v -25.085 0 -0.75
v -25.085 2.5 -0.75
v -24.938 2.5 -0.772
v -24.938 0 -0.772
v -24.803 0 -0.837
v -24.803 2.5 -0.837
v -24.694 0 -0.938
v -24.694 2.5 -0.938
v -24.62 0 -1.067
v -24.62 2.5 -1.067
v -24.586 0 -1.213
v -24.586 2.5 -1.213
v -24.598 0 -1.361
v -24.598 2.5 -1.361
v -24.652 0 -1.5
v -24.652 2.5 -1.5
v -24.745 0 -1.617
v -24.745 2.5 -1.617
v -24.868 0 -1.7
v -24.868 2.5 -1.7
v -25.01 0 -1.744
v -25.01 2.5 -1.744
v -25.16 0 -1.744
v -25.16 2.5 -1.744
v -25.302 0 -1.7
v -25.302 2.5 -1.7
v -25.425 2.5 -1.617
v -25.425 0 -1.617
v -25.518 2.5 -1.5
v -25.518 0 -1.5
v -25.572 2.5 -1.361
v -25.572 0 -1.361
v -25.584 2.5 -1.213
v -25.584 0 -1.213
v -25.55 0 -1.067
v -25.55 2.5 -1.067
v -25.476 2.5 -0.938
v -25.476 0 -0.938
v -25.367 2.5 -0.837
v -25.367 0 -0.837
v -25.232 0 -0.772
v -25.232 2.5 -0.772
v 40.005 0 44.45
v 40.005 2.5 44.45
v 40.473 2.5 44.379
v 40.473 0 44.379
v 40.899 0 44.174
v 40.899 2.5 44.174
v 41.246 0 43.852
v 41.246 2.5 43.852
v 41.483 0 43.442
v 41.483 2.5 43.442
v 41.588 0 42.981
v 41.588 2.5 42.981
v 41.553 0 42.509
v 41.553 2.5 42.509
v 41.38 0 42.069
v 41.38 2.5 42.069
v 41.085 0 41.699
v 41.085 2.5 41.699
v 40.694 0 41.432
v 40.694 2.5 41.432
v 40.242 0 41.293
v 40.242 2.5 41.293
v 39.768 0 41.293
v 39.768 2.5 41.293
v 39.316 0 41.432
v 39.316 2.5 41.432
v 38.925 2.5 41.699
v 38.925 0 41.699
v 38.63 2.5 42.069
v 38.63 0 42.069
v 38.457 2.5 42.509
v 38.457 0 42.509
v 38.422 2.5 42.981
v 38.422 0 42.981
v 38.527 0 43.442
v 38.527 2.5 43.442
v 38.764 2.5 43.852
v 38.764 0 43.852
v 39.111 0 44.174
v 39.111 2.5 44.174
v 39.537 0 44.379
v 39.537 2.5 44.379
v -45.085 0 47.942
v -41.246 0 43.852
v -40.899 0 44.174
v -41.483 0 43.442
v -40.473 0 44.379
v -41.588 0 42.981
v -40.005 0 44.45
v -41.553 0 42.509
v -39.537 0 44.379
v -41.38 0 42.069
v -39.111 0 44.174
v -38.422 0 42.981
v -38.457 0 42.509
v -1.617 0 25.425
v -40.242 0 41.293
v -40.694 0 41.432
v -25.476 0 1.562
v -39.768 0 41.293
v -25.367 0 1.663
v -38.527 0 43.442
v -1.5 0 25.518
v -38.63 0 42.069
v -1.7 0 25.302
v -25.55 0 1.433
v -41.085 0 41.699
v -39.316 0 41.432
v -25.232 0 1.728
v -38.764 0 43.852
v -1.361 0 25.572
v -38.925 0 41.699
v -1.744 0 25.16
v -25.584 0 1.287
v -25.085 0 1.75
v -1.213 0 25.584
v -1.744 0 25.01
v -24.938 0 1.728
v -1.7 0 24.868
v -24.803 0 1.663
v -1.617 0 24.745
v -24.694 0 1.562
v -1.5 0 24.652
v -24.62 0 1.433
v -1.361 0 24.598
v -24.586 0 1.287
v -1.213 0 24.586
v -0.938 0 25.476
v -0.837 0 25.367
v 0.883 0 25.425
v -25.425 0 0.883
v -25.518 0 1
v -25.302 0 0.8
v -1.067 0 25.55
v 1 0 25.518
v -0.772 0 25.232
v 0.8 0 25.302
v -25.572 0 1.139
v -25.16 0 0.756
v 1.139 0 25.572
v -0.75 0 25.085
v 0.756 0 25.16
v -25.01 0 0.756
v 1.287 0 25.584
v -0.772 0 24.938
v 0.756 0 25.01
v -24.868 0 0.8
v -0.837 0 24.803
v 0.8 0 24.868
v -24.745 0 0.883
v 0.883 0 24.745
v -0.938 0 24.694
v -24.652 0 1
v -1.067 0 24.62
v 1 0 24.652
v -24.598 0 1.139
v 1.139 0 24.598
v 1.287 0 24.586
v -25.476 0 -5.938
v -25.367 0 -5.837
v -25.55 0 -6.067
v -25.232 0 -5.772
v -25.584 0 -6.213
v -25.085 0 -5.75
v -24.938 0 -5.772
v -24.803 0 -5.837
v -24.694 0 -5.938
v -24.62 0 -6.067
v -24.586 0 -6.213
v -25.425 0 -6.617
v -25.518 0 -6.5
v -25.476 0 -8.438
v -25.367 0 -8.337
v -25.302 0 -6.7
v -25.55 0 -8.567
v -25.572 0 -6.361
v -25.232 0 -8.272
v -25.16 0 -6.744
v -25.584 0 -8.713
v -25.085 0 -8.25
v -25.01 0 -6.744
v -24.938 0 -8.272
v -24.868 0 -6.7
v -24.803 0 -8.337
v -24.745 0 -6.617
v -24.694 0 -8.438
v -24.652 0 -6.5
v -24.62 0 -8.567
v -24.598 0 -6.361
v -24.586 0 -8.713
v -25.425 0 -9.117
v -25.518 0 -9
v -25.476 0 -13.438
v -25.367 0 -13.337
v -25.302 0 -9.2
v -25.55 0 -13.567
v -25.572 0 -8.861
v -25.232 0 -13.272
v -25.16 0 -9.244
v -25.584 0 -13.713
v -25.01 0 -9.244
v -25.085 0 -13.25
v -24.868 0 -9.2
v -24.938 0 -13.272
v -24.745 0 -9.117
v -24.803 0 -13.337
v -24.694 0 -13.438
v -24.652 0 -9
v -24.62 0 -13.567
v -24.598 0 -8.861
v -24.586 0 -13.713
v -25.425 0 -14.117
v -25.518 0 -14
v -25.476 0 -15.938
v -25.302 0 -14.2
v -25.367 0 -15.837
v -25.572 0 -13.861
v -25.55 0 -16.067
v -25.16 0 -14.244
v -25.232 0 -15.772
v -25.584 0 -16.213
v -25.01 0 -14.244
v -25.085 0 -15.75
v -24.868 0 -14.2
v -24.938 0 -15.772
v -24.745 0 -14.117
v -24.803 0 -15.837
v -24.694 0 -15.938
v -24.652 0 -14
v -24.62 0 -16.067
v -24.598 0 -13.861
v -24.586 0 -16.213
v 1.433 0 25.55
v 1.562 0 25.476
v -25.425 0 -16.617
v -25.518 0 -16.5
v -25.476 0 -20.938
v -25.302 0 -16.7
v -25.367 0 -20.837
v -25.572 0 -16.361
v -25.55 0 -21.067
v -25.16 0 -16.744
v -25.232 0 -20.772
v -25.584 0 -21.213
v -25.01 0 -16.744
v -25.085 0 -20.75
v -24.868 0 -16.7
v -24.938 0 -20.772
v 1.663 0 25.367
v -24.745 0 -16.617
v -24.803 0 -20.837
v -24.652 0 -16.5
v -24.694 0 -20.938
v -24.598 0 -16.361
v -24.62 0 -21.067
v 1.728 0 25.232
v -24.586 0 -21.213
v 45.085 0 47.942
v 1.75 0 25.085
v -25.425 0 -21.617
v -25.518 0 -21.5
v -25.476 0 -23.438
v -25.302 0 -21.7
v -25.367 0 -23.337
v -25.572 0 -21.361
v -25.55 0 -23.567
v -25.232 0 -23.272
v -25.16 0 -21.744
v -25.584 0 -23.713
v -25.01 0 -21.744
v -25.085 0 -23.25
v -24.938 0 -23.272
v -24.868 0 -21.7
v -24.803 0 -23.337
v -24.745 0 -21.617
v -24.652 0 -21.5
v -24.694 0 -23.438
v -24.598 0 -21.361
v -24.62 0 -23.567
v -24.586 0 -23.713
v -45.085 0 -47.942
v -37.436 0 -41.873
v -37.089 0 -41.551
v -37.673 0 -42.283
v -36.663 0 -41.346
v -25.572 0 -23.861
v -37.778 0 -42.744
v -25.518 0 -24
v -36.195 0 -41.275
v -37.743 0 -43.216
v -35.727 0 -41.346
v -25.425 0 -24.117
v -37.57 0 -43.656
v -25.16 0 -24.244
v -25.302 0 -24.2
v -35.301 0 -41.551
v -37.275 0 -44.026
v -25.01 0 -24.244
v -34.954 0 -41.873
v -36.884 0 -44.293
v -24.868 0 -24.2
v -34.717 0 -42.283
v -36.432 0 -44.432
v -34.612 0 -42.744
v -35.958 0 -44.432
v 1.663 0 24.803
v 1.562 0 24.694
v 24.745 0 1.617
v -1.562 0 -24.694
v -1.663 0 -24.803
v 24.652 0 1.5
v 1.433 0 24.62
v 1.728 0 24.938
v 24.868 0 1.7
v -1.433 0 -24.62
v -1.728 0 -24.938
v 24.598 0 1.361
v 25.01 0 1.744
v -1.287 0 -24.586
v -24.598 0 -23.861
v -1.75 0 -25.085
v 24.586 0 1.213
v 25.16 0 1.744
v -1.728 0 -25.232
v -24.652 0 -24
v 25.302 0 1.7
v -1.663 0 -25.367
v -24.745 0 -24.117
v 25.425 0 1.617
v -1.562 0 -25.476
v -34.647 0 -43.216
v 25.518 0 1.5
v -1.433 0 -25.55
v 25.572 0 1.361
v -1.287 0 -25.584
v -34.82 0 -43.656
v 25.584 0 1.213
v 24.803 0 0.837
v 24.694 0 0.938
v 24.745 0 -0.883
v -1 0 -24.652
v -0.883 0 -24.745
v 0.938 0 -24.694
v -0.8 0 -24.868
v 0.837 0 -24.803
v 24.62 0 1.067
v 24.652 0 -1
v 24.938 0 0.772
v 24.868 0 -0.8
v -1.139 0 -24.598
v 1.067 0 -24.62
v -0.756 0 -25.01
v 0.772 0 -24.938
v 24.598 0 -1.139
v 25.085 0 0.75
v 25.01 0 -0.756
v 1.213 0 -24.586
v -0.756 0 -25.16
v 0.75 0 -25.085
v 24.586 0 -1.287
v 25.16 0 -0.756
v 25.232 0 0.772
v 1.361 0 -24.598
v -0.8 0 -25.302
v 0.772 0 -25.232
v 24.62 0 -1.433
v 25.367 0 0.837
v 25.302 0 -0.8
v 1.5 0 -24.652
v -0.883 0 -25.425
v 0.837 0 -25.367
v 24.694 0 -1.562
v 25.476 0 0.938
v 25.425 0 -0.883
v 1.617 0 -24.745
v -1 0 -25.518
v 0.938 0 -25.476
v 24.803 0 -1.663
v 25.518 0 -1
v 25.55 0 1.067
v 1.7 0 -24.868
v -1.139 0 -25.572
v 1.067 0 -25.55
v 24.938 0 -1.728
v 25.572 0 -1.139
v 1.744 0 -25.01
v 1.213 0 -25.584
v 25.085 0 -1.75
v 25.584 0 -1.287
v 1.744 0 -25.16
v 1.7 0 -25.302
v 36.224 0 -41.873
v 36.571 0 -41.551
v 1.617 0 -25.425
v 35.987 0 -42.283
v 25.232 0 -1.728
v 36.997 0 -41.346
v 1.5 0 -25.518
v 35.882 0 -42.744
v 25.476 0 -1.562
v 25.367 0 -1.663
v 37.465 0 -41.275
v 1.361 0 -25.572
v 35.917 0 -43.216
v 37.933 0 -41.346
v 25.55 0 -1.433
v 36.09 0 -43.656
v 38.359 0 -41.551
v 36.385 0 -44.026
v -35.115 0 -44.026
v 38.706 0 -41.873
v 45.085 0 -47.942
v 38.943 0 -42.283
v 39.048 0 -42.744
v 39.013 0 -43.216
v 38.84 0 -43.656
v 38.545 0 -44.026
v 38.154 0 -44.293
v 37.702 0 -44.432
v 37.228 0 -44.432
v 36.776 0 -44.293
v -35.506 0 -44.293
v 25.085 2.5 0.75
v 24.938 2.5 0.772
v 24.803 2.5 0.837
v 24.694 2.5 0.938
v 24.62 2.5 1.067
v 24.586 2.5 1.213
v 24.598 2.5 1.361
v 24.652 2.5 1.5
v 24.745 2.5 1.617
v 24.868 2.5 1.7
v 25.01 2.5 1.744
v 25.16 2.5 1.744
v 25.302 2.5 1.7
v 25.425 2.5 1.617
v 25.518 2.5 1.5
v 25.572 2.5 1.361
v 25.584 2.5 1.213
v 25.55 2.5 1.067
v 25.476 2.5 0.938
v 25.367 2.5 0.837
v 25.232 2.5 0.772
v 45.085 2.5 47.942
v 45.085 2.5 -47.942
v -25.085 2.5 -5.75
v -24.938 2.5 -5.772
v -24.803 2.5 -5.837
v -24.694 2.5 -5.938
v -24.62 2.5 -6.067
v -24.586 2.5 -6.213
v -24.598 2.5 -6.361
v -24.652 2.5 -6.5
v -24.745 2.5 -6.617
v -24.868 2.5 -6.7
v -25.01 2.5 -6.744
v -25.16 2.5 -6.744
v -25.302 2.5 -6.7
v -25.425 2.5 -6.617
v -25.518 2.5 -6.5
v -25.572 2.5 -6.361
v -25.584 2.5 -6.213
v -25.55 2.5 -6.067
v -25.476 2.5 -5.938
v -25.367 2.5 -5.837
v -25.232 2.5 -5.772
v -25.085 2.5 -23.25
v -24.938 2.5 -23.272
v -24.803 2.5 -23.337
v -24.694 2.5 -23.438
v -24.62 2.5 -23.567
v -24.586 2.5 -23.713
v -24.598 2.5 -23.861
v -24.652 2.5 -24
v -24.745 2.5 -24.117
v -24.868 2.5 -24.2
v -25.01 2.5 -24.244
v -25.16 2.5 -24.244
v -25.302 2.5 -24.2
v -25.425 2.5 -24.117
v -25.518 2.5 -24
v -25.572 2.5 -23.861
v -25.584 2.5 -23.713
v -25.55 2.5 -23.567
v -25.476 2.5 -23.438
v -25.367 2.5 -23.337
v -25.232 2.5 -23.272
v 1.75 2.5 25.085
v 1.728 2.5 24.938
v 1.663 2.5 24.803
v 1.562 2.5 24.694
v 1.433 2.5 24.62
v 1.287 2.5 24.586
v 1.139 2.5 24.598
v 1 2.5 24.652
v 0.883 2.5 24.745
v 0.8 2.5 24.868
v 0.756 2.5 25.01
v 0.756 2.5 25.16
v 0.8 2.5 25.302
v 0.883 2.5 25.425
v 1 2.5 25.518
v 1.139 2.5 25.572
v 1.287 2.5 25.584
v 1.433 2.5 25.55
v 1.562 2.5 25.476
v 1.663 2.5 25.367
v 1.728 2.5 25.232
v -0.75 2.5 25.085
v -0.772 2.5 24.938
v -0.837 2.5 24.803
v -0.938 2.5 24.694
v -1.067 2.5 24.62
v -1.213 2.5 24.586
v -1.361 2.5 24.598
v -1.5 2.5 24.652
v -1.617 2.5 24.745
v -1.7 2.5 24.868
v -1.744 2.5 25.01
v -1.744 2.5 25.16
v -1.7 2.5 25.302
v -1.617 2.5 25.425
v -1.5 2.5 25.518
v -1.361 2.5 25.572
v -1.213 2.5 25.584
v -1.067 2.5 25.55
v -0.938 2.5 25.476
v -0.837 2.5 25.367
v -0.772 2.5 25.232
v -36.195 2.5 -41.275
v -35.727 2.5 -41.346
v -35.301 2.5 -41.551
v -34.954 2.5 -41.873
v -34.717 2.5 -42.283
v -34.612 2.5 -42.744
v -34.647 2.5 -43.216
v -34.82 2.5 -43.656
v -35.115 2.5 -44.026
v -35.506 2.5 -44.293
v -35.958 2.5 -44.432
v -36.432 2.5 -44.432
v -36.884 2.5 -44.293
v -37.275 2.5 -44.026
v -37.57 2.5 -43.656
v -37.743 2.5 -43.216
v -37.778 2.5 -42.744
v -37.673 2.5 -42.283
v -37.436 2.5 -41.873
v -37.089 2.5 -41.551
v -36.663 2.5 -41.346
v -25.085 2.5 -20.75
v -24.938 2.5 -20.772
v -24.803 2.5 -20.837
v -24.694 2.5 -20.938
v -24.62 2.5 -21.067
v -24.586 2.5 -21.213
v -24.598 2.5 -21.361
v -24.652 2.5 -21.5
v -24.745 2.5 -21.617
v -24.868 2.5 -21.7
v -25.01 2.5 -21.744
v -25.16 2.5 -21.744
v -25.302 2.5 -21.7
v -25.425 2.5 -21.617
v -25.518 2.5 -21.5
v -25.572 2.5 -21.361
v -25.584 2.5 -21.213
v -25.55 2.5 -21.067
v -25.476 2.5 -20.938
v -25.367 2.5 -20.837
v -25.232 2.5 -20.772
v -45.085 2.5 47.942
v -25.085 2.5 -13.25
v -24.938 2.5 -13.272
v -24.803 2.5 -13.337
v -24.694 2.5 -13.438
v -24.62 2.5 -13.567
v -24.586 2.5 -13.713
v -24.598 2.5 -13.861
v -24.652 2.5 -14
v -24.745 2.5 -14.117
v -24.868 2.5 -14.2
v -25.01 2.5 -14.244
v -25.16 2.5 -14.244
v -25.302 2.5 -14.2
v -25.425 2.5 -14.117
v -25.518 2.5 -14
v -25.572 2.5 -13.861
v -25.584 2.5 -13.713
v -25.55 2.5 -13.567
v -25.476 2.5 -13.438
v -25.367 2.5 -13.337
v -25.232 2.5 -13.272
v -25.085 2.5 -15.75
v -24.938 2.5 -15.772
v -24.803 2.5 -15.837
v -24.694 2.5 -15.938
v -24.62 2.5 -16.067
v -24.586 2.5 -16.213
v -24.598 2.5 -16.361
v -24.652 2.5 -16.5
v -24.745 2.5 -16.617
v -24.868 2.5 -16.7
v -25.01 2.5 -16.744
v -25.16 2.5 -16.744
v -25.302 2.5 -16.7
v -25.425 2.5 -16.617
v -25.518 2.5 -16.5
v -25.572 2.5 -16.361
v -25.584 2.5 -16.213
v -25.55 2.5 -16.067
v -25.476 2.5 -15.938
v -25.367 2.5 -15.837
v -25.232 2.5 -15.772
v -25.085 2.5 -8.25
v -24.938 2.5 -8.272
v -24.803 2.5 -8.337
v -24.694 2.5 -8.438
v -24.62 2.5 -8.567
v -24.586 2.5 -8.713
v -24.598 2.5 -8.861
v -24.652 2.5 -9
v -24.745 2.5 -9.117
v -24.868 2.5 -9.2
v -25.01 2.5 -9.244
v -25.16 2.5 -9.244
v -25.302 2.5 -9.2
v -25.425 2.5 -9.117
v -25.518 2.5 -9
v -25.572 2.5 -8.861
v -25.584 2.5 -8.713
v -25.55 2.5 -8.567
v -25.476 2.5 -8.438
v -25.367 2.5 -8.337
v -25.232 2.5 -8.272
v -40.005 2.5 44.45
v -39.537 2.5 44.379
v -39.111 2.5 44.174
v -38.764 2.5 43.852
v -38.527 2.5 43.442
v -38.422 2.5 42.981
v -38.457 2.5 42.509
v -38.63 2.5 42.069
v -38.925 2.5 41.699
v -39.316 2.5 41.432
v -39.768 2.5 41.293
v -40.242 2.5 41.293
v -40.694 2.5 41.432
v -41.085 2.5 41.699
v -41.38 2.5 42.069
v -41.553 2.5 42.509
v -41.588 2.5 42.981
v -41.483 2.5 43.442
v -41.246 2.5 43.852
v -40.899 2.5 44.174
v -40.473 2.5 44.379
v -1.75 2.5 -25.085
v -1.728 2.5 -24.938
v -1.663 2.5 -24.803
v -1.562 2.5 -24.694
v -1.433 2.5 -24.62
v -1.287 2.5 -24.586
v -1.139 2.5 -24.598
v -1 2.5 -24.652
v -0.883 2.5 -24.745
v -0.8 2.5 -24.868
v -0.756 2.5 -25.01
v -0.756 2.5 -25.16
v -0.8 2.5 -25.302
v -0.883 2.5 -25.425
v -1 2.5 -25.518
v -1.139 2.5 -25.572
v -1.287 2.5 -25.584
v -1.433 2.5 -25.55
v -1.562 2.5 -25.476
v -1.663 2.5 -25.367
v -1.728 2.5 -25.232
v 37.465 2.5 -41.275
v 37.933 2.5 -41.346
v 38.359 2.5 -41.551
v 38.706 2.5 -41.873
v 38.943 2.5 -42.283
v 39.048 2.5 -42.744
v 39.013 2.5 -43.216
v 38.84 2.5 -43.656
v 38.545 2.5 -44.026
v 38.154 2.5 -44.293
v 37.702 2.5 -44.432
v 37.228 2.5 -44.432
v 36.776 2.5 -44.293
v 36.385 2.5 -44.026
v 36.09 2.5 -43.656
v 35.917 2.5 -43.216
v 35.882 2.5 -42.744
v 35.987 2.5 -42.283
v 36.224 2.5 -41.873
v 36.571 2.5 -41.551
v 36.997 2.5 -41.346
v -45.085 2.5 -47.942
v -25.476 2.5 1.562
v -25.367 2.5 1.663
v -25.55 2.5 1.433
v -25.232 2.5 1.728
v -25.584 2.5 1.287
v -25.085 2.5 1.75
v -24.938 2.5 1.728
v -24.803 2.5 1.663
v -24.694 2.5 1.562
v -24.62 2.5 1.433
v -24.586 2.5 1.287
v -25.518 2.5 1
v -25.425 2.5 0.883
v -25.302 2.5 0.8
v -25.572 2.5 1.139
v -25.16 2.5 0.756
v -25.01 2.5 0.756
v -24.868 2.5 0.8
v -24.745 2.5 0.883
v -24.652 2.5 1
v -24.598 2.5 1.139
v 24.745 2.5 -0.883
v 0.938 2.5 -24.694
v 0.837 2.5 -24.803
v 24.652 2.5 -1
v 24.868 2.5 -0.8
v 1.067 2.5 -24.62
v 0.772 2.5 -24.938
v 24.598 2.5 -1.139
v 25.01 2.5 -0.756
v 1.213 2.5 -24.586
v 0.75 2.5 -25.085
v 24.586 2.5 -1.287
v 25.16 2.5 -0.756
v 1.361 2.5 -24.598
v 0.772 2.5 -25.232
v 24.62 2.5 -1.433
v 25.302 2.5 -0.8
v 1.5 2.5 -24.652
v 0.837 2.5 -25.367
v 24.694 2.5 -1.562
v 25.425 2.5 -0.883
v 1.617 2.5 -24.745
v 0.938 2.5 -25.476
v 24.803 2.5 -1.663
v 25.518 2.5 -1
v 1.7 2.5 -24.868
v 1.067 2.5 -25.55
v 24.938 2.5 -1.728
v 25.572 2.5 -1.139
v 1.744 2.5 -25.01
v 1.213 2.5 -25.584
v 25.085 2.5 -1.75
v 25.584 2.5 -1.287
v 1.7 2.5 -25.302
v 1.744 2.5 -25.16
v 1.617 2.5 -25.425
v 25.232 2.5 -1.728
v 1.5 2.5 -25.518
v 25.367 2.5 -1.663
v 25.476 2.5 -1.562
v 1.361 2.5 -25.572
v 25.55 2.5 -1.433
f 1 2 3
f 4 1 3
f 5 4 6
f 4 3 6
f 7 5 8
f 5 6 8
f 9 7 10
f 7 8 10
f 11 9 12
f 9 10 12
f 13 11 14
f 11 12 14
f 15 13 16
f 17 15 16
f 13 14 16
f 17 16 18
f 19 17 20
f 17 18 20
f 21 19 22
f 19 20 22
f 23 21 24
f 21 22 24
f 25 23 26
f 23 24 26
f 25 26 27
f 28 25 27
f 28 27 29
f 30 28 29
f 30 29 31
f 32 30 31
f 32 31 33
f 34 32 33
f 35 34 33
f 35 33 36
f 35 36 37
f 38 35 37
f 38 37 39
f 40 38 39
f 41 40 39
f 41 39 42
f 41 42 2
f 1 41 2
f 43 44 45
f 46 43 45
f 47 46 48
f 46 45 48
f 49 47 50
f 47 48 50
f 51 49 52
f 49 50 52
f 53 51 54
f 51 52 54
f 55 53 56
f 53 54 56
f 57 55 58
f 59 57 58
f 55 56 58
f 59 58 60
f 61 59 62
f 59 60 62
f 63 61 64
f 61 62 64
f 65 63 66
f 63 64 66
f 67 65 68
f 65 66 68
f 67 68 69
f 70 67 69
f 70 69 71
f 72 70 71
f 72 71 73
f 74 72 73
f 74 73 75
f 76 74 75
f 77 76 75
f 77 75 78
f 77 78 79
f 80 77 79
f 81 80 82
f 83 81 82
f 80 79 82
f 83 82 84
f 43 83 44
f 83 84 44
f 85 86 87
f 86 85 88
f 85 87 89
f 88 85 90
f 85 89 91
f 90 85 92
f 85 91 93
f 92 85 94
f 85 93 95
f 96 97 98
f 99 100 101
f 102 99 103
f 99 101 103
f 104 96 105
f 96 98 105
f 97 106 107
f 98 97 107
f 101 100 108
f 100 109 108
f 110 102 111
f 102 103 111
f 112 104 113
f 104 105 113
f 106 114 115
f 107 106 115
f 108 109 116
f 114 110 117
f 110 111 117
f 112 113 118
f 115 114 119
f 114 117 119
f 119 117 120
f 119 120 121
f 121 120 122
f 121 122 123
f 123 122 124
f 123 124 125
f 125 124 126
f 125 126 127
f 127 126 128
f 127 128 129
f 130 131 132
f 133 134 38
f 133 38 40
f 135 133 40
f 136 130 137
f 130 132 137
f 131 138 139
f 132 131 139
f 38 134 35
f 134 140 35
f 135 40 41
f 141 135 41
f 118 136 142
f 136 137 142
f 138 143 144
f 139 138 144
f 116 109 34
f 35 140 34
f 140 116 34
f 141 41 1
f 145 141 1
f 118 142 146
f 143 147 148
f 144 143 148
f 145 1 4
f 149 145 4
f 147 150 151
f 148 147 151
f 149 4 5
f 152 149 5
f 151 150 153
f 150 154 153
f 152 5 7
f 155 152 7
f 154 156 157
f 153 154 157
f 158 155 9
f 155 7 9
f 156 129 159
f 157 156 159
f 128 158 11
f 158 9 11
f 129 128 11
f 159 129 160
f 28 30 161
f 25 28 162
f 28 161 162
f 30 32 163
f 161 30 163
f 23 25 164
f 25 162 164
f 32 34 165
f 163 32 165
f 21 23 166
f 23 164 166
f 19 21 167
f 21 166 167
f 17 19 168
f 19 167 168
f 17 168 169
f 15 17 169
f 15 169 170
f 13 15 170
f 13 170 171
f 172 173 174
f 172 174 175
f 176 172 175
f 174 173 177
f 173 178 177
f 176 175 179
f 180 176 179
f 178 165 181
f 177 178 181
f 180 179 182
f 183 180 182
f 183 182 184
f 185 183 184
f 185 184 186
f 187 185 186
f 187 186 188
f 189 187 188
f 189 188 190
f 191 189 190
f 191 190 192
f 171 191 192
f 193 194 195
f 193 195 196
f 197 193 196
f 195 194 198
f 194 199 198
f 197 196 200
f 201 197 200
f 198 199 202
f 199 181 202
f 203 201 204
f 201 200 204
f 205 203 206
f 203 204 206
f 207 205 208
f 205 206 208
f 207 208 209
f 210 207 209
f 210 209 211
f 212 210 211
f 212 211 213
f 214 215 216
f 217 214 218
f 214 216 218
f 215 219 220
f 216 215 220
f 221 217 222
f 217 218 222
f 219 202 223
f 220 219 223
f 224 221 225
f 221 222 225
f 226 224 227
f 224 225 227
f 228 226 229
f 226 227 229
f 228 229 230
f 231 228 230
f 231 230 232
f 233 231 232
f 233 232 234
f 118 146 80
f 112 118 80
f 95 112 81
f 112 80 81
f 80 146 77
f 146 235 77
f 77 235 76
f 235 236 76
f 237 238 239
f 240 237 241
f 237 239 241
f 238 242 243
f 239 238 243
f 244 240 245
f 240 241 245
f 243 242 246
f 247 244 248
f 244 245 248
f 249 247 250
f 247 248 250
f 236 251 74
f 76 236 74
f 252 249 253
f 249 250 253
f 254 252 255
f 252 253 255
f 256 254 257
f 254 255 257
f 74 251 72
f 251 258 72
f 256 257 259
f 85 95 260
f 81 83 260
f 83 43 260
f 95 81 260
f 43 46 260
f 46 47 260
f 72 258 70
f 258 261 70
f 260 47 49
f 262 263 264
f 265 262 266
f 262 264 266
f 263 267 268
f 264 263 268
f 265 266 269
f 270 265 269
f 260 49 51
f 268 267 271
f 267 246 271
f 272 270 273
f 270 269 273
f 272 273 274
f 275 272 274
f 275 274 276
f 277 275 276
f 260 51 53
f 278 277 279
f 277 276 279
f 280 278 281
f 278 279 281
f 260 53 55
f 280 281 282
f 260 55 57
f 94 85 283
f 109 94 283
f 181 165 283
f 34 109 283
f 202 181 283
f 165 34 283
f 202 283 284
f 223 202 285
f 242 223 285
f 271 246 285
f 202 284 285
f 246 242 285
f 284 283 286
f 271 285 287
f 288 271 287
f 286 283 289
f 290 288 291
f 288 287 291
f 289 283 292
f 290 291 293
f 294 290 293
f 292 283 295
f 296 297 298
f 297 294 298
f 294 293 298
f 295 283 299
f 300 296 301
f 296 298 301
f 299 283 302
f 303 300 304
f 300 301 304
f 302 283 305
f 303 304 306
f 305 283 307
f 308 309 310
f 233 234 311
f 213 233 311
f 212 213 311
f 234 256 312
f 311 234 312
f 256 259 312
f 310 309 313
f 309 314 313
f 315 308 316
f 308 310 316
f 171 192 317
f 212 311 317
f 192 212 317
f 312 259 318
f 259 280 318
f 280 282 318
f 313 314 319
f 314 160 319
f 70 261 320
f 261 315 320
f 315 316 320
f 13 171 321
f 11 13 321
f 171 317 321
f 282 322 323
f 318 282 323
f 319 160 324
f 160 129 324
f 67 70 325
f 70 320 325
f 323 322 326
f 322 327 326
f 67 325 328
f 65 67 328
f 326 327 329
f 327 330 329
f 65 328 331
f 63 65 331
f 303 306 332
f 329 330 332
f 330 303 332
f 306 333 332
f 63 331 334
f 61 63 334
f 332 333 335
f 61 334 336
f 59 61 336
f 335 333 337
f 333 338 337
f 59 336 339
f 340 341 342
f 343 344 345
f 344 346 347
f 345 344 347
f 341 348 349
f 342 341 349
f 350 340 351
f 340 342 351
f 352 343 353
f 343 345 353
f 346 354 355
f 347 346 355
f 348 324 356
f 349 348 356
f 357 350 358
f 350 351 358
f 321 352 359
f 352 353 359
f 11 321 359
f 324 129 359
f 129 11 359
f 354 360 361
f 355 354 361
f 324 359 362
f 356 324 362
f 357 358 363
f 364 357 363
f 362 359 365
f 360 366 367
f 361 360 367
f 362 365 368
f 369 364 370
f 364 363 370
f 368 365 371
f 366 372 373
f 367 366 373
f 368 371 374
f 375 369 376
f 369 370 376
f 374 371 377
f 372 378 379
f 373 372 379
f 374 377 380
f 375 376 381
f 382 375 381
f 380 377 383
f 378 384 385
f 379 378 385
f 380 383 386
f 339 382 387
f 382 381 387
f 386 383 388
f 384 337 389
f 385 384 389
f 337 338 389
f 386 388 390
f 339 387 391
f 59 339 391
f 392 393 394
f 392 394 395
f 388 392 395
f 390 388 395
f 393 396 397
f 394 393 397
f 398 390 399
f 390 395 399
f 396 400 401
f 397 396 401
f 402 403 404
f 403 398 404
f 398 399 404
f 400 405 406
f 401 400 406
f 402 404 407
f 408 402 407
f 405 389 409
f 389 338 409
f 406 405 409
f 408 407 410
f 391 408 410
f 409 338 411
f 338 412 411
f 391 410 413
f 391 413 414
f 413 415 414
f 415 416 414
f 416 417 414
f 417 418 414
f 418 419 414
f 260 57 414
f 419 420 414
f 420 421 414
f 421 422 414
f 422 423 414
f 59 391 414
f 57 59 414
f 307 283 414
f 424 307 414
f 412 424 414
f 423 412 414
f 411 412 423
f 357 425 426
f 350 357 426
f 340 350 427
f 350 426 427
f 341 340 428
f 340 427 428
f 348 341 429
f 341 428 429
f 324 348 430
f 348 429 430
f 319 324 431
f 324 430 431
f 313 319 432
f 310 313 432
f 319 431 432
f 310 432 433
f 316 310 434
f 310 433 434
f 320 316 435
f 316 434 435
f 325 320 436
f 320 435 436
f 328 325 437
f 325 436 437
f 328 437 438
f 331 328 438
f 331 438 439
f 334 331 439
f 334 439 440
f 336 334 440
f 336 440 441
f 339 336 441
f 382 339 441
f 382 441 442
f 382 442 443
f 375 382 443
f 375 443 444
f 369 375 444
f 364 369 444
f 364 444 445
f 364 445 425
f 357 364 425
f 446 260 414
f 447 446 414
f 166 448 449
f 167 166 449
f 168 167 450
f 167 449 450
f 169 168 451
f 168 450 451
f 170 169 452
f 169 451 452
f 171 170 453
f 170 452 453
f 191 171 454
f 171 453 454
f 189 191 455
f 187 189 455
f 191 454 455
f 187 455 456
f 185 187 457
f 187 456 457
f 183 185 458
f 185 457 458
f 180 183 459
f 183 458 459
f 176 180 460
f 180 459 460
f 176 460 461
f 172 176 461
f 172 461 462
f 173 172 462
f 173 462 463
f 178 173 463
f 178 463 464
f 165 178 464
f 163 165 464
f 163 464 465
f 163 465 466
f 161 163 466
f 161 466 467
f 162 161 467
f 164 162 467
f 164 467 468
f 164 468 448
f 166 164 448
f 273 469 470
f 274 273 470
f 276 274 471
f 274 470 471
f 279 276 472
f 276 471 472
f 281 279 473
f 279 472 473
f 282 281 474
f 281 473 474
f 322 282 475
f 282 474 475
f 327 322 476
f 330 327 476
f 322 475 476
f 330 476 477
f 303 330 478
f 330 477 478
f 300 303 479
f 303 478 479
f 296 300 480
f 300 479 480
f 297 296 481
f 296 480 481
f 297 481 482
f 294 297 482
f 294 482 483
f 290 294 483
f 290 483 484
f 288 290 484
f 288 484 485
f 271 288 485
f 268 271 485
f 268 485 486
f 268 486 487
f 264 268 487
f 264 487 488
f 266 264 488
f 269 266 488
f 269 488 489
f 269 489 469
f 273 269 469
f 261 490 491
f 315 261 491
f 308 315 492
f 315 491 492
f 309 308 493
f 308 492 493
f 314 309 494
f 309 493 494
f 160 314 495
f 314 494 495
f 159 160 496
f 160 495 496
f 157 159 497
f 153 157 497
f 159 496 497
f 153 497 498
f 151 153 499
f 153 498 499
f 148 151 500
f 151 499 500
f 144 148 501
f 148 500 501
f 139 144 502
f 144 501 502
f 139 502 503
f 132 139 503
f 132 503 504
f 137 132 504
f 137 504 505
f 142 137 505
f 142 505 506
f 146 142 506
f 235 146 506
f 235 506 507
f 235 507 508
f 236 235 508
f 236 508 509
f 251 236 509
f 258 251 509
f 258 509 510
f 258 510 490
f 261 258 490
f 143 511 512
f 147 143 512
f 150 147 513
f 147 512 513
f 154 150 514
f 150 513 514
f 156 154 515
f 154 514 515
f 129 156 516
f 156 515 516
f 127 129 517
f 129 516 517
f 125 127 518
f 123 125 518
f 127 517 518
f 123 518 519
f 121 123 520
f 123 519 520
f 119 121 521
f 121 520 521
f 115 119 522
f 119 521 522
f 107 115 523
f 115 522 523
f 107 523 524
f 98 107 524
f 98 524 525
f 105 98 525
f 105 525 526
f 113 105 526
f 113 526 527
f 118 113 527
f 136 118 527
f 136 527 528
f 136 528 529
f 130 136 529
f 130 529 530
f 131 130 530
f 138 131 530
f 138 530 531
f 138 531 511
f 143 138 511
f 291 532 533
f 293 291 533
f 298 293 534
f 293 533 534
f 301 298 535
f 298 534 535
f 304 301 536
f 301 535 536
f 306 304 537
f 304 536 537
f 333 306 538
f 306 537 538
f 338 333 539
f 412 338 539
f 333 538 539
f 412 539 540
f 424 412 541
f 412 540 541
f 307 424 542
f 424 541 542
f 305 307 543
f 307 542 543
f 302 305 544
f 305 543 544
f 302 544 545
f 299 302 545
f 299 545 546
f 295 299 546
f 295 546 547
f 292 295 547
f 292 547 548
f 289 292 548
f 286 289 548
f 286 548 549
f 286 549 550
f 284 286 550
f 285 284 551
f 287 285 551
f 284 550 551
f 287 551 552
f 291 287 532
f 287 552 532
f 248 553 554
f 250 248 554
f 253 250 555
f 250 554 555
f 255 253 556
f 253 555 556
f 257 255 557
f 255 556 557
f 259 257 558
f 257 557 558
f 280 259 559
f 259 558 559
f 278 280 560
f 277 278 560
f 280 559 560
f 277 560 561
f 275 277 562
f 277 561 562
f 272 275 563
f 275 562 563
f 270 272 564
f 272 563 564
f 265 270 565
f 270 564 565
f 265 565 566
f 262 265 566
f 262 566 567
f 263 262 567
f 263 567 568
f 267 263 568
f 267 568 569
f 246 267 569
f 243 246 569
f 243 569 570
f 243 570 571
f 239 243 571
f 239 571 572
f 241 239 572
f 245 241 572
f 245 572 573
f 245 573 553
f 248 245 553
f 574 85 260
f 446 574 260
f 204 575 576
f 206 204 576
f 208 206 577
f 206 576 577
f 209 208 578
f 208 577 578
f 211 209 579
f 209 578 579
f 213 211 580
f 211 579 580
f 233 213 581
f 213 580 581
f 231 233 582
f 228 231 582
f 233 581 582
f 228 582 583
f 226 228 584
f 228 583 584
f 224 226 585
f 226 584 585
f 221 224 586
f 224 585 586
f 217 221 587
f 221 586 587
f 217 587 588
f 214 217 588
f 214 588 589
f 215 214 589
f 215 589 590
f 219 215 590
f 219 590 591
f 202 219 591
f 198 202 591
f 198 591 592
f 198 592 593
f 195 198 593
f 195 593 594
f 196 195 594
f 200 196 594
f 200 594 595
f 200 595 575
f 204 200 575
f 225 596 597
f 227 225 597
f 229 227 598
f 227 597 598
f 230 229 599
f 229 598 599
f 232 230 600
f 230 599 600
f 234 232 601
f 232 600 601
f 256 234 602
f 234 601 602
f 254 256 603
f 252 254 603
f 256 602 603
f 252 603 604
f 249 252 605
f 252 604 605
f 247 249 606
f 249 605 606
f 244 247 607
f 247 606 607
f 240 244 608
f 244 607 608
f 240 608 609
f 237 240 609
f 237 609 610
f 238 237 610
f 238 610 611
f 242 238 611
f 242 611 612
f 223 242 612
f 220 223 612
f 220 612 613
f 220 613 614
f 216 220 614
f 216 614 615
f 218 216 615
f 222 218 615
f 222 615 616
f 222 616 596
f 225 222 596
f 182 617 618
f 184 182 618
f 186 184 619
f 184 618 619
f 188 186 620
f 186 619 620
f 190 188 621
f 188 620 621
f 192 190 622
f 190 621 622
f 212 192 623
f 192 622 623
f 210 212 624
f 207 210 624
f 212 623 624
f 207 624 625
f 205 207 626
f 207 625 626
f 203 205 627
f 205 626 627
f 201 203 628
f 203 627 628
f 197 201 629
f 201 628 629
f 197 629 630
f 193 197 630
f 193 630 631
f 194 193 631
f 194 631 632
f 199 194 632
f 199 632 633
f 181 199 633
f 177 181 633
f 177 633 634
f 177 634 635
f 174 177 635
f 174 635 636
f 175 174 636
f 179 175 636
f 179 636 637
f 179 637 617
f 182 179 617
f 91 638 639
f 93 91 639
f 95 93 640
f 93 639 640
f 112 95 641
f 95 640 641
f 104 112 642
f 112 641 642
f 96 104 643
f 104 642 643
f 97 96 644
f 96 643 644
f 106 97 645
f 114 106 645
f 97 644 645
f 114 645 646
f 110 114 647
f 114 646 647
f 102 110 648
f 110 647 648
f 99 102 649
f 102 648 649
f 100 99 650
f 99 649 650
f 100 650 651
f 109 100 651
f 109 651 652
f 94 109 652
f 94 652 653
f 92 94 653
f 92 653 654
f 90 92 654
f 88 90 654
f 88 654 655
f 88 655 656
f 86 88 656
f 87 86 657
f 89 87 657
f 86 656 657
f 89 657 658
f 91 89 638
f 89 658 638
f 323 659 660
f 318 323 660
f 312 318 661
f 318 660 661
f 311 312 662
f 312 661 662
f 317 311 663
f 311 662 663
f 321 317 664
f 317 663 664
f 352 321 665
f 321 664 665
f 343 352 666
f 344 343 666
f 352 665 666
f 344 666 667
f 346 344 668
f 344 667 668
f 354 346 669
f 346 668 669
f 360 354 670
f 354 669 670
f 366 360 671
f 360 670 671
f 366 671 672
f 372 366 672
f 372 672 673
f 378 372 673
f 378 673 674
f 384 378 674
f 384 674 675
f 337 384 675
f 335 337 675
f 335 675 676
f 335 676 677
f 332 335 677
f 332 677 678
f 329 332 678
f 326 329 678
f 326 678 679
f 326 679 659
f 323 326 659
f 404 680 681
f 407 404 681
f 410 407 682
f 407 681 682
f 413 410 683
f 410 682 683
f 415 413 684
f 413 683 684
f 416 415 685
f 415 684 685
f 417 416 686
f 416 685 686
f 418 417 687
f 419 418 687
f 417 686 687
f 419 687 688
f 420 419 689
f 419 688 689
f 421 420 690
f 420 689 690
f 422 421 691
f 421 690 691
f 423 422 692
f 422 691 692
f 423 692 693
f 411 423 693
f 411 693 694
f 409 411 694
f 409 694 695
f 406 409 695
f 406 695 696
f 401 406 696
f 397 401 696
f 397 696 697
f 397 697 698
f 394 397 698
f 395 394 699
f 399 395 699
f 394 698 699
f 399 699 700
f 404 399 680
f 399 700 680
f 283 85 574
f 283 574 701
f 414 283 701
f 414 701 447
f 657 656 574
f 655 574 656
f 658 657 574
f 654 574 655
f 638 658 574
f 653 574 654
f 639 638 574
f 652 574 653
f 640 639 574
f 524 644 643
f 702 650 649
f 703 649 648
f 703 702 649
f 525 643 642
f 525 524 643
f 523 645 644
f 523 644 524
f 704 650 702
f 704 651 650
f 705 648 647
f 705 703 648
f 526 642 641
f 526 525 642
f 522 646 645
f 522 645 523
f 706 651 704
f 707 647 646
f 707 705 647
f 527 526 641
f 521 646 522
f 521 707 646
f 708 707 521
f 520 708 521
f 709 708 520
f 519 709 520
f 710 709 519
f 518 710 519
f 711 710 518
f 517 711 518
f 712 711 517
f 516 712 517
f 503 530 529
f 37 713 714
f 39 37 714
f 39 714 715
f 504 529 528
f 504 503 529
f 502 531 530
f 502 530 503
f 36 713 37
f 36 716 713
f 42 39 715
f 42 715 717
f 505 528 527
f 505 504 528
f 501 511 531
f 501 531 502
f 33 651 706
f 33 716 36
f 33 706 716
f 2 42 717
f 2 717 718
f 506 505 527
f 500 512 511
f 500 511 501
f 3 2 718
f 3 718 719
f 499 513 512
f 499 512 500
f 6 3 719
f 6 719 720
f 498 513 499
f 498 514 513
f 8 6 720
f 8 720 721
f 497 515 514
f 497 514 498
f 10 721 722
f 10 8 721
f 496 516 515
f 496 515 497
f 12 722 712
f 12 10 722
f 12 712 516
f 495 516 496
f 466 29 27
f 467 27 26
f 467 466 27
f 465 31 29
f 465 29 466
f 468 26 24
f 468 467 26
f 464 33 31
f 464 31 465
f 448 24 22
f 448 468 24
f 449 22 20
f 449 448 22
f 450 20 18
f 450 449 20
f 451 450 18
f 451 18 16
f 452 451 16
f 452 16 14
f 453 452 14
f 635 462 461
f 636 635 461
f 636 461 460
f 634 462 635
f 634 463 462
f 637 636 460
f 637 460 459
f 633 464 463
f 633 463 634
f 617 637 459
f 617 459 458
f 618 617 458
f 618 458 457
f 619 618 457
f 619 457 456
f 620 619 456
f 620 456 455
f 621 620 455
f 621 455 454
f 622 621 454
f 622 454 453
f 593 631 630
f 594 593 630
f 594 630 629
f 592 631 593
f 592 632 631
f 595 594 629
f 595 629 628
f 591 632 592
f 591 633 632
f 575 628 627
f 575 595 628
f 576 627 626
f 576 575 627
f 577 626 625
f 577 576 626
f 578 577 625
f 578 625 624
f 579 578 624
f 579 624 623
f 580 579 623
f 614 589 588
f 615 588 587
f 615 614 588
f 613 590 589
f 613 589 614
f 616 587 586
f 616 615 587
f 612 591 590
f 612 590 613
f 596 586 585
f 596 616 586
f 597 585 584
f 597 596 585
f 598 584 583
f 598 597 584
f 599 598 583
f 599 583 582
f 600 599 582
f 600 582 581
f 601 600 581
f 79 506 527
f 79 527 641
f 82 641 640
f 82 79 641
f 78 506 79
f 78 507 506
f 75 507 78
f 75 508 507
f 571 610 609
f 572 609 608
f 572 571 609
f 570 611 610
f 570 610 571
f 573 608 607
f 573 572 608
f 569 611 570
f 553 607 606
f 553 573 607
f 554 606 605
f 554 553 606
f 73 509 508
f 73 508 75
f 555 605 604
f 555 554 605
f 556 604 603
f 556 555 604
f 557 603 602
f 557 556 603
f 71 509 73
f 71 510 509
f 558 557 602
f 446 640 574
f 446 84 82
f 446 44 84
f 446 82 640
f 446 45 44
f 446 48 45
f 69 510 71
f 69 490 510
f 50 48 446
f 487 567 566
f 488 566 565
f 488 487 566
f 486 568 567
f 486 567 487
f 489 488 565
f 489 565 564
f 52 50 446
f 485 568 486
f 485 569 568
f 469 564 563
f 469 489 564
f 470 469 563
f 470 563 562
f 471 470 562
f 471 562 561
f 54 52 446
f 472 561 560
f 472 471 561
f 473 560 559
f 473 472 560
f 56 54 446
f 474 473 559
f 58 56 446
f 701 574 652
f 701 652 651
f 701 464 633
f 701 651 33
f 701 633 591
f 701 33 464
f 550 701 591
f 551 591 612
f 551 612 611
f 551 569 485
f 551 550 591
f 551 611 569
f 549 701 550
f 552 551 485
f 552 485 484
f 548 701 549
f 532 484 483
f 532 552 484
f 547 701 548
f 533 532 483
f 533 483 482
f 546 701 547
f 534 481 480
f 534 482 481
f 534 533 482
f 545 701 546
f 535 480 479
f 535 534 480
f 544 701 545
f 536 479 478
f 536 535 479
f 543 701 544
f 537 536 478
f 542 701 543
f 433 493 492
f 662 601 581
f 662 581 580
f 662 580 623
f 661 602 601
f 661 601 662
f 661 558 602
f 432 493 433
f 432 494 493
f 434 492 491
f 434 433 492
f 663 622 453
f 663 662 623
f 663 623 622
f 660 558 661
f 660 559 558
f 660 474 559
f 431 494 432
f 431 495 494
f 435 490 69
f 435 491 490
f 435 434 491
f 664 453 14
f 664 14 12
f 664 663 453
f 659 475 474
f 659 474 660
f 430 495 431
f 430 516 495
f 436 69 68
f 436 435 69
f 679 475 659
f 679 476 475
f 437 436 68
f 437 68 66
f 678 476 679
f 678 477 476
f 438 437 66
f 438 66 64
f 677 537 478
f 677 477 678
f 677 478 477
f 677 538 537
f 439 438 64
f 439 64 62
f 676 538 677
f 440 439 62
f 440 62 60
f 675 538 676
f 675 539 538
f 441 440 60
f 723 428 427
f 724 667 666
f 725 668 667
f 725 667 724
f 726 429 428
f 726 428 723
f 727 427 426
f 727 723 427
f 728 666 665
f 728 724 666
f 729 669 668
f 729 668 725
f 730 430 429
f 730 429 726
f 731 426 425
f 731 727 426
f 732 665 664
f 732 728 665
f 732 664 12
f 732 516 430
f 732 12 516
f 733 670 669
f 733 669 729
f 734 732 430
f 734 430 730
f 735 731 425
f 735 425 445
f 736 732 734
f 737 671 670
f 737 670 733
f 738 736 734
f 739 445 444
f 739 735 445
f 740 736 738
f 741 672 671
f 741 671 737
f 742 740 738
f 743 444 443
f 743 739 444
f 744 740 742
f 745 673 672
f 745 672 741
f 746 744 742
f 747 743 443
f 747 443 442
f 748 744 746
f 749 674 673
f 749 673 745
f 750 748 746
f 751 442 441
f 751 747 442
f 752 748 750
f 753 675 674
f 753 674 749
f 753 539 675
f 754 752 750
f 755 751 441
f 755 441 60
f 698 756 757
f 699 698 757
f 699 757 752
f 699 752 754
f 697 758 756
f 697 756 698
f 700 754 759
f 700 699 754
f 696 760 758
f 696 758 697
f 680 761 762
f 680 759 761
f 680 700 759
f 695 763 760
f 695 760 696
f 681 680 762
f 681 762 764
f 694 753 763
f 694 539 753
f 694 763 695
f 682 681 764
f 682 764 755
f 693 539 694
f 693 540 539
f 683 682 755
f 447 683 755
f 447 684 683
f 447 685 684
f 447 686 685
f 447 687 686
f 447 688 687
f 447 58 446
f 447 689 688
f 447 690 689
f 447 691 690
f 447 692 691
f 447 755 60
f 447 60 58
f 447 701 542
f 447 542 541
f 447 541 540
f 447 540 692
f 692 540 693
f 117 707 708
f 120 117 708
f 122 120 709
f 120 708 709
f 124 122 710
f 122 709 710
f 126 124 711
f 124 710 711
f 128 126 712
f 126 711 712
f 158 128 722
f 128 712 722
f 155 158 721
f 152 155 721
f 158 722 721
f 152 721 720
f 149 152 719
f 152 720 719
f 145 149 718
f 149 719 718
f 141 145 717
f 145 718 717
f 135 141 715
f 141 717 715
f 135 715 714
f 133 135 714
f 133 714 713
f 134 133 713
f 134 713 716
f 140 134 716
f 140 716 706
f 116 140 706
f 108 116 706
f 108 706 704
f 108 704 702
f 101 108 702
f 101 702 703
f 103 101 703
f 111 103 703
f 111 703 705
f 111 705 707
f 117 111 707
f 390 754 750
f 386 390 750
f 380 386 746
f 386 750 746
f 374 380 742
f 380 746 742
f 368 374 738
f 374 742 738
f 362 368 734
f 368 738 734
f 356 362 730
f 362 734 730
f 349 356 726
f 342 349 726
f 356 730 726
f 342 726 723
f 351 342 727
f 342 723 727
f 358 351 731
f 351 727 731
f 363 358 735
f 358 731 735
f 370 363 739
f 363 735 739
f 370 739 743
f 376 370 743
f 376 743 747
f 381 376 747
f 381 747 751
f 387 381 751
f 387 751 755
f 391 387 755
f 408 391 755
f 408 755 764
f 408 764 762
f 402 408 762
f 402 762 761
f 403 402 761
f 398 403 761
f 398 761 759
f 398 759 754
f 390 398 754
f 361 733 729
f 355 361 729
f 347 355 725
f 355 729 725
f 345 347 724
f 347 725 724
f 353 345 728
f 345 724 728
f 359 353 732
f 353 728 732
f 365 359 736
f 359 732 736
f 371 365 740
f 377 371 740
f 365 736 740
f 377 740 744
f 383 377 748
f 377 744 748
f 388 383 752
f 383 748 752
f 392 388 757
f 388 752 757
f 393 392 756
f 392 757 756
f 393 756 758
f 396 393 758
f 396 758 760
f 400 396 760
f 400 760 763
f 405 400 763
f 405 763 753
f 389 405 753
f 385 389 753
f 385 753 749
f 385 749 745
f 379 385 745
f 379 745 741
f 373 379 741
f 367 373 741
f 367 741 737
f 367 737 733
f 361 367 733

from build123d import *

# Parameters (mm, degrees)
SKETCH1_W           = 90.17
SKETCH1_H           = 95.885
BOSS_EXTRUDE1_DEPTH = 2.5
SKETCH2_R           = 1.5875
CUT_EXTRUDE1_DEPTH  = 2.5
SKETCH3_R           = 0.5
CUT_EXTRUDE2_DEPTH  = 10
CIRPATTERN1_COUNT   = 4
LPATTERN1_COUNT     = 4
LPATTERN1_PITCH     = 7.5


with BuildPart() as part:
    # Sketch1 → Boss-Extrude1 (new body)
    with BuildSketch(Plane(origin=(0, 0, 0), x_dir=(1, 0, 0), z_dir=(0, 1, 0))):
        Rectangle(SKETCH1_W, SKETCH1_H)
    extrude(amount=BOSS_EXTRUDE1_DEPTH)

    # Sketch2 → Cut-Extrude1 (cut)
    with BuildSketch(Plane(origin=(0, 2.5, 0), x_dir=(1, 0, 0), z_dir=(0, 1, 0))):
        with Locations((-40.005, -42.8625)):
            Circle(SKETCH2_R)
        with Locations((-36.195, 42.8625)):
            Circle(SKETCH2_R)
        with Locations((37.465, 42.8625)):
            Circle(SKETCH2_R)
        with Locations((40.005, -42.8625)):
            Circle(SKETCH2_R)
    extrude(amount=-CUT_EXTRUDE1_DEPTH, mode=Mode.SUBTRACT)

    # Sketch3 → Cut-Extrude2 (cut)
    with BuildSketch(Plane(origin=(0, 2.5, 0), x_dir=(1, 0, 0), z_dir=(0, 1, 0))):
        with Locations((-25.085, 1.25)):
            Circle(SKETCH3_R)
        with Locations((-25.085, -1.25)):
            Circle(SKETCH3_R)
    cut_extrude2 = extrude(amount=-CUT_EXTRUDE2_DEPTH, mode=Mode.SUBTRACT)

    # CirPattern1: Cut-Extrude2 ×4 about axis
    cirpattern1_axis = Axis((0, 50, 0), (0, -1, 0))
    for i in range(1, CIRPATTERN1_COUNT):
        add(cut_extrude2.rotate(cirpattern1_axis, i * 360 / CIRPATTERN1_COUNT), mode=Mode.SUBTRACT)

    # LPattern1: Cut-Extrude2 ×4
    with Locations(*[(0, 0, -i * LPATTERN1_PITCH) for i in range(1, LPATTERN1_COUNT)]):
        add(cut_extrude2, mode=Mode.SUBTRACT)


solid = part.part
